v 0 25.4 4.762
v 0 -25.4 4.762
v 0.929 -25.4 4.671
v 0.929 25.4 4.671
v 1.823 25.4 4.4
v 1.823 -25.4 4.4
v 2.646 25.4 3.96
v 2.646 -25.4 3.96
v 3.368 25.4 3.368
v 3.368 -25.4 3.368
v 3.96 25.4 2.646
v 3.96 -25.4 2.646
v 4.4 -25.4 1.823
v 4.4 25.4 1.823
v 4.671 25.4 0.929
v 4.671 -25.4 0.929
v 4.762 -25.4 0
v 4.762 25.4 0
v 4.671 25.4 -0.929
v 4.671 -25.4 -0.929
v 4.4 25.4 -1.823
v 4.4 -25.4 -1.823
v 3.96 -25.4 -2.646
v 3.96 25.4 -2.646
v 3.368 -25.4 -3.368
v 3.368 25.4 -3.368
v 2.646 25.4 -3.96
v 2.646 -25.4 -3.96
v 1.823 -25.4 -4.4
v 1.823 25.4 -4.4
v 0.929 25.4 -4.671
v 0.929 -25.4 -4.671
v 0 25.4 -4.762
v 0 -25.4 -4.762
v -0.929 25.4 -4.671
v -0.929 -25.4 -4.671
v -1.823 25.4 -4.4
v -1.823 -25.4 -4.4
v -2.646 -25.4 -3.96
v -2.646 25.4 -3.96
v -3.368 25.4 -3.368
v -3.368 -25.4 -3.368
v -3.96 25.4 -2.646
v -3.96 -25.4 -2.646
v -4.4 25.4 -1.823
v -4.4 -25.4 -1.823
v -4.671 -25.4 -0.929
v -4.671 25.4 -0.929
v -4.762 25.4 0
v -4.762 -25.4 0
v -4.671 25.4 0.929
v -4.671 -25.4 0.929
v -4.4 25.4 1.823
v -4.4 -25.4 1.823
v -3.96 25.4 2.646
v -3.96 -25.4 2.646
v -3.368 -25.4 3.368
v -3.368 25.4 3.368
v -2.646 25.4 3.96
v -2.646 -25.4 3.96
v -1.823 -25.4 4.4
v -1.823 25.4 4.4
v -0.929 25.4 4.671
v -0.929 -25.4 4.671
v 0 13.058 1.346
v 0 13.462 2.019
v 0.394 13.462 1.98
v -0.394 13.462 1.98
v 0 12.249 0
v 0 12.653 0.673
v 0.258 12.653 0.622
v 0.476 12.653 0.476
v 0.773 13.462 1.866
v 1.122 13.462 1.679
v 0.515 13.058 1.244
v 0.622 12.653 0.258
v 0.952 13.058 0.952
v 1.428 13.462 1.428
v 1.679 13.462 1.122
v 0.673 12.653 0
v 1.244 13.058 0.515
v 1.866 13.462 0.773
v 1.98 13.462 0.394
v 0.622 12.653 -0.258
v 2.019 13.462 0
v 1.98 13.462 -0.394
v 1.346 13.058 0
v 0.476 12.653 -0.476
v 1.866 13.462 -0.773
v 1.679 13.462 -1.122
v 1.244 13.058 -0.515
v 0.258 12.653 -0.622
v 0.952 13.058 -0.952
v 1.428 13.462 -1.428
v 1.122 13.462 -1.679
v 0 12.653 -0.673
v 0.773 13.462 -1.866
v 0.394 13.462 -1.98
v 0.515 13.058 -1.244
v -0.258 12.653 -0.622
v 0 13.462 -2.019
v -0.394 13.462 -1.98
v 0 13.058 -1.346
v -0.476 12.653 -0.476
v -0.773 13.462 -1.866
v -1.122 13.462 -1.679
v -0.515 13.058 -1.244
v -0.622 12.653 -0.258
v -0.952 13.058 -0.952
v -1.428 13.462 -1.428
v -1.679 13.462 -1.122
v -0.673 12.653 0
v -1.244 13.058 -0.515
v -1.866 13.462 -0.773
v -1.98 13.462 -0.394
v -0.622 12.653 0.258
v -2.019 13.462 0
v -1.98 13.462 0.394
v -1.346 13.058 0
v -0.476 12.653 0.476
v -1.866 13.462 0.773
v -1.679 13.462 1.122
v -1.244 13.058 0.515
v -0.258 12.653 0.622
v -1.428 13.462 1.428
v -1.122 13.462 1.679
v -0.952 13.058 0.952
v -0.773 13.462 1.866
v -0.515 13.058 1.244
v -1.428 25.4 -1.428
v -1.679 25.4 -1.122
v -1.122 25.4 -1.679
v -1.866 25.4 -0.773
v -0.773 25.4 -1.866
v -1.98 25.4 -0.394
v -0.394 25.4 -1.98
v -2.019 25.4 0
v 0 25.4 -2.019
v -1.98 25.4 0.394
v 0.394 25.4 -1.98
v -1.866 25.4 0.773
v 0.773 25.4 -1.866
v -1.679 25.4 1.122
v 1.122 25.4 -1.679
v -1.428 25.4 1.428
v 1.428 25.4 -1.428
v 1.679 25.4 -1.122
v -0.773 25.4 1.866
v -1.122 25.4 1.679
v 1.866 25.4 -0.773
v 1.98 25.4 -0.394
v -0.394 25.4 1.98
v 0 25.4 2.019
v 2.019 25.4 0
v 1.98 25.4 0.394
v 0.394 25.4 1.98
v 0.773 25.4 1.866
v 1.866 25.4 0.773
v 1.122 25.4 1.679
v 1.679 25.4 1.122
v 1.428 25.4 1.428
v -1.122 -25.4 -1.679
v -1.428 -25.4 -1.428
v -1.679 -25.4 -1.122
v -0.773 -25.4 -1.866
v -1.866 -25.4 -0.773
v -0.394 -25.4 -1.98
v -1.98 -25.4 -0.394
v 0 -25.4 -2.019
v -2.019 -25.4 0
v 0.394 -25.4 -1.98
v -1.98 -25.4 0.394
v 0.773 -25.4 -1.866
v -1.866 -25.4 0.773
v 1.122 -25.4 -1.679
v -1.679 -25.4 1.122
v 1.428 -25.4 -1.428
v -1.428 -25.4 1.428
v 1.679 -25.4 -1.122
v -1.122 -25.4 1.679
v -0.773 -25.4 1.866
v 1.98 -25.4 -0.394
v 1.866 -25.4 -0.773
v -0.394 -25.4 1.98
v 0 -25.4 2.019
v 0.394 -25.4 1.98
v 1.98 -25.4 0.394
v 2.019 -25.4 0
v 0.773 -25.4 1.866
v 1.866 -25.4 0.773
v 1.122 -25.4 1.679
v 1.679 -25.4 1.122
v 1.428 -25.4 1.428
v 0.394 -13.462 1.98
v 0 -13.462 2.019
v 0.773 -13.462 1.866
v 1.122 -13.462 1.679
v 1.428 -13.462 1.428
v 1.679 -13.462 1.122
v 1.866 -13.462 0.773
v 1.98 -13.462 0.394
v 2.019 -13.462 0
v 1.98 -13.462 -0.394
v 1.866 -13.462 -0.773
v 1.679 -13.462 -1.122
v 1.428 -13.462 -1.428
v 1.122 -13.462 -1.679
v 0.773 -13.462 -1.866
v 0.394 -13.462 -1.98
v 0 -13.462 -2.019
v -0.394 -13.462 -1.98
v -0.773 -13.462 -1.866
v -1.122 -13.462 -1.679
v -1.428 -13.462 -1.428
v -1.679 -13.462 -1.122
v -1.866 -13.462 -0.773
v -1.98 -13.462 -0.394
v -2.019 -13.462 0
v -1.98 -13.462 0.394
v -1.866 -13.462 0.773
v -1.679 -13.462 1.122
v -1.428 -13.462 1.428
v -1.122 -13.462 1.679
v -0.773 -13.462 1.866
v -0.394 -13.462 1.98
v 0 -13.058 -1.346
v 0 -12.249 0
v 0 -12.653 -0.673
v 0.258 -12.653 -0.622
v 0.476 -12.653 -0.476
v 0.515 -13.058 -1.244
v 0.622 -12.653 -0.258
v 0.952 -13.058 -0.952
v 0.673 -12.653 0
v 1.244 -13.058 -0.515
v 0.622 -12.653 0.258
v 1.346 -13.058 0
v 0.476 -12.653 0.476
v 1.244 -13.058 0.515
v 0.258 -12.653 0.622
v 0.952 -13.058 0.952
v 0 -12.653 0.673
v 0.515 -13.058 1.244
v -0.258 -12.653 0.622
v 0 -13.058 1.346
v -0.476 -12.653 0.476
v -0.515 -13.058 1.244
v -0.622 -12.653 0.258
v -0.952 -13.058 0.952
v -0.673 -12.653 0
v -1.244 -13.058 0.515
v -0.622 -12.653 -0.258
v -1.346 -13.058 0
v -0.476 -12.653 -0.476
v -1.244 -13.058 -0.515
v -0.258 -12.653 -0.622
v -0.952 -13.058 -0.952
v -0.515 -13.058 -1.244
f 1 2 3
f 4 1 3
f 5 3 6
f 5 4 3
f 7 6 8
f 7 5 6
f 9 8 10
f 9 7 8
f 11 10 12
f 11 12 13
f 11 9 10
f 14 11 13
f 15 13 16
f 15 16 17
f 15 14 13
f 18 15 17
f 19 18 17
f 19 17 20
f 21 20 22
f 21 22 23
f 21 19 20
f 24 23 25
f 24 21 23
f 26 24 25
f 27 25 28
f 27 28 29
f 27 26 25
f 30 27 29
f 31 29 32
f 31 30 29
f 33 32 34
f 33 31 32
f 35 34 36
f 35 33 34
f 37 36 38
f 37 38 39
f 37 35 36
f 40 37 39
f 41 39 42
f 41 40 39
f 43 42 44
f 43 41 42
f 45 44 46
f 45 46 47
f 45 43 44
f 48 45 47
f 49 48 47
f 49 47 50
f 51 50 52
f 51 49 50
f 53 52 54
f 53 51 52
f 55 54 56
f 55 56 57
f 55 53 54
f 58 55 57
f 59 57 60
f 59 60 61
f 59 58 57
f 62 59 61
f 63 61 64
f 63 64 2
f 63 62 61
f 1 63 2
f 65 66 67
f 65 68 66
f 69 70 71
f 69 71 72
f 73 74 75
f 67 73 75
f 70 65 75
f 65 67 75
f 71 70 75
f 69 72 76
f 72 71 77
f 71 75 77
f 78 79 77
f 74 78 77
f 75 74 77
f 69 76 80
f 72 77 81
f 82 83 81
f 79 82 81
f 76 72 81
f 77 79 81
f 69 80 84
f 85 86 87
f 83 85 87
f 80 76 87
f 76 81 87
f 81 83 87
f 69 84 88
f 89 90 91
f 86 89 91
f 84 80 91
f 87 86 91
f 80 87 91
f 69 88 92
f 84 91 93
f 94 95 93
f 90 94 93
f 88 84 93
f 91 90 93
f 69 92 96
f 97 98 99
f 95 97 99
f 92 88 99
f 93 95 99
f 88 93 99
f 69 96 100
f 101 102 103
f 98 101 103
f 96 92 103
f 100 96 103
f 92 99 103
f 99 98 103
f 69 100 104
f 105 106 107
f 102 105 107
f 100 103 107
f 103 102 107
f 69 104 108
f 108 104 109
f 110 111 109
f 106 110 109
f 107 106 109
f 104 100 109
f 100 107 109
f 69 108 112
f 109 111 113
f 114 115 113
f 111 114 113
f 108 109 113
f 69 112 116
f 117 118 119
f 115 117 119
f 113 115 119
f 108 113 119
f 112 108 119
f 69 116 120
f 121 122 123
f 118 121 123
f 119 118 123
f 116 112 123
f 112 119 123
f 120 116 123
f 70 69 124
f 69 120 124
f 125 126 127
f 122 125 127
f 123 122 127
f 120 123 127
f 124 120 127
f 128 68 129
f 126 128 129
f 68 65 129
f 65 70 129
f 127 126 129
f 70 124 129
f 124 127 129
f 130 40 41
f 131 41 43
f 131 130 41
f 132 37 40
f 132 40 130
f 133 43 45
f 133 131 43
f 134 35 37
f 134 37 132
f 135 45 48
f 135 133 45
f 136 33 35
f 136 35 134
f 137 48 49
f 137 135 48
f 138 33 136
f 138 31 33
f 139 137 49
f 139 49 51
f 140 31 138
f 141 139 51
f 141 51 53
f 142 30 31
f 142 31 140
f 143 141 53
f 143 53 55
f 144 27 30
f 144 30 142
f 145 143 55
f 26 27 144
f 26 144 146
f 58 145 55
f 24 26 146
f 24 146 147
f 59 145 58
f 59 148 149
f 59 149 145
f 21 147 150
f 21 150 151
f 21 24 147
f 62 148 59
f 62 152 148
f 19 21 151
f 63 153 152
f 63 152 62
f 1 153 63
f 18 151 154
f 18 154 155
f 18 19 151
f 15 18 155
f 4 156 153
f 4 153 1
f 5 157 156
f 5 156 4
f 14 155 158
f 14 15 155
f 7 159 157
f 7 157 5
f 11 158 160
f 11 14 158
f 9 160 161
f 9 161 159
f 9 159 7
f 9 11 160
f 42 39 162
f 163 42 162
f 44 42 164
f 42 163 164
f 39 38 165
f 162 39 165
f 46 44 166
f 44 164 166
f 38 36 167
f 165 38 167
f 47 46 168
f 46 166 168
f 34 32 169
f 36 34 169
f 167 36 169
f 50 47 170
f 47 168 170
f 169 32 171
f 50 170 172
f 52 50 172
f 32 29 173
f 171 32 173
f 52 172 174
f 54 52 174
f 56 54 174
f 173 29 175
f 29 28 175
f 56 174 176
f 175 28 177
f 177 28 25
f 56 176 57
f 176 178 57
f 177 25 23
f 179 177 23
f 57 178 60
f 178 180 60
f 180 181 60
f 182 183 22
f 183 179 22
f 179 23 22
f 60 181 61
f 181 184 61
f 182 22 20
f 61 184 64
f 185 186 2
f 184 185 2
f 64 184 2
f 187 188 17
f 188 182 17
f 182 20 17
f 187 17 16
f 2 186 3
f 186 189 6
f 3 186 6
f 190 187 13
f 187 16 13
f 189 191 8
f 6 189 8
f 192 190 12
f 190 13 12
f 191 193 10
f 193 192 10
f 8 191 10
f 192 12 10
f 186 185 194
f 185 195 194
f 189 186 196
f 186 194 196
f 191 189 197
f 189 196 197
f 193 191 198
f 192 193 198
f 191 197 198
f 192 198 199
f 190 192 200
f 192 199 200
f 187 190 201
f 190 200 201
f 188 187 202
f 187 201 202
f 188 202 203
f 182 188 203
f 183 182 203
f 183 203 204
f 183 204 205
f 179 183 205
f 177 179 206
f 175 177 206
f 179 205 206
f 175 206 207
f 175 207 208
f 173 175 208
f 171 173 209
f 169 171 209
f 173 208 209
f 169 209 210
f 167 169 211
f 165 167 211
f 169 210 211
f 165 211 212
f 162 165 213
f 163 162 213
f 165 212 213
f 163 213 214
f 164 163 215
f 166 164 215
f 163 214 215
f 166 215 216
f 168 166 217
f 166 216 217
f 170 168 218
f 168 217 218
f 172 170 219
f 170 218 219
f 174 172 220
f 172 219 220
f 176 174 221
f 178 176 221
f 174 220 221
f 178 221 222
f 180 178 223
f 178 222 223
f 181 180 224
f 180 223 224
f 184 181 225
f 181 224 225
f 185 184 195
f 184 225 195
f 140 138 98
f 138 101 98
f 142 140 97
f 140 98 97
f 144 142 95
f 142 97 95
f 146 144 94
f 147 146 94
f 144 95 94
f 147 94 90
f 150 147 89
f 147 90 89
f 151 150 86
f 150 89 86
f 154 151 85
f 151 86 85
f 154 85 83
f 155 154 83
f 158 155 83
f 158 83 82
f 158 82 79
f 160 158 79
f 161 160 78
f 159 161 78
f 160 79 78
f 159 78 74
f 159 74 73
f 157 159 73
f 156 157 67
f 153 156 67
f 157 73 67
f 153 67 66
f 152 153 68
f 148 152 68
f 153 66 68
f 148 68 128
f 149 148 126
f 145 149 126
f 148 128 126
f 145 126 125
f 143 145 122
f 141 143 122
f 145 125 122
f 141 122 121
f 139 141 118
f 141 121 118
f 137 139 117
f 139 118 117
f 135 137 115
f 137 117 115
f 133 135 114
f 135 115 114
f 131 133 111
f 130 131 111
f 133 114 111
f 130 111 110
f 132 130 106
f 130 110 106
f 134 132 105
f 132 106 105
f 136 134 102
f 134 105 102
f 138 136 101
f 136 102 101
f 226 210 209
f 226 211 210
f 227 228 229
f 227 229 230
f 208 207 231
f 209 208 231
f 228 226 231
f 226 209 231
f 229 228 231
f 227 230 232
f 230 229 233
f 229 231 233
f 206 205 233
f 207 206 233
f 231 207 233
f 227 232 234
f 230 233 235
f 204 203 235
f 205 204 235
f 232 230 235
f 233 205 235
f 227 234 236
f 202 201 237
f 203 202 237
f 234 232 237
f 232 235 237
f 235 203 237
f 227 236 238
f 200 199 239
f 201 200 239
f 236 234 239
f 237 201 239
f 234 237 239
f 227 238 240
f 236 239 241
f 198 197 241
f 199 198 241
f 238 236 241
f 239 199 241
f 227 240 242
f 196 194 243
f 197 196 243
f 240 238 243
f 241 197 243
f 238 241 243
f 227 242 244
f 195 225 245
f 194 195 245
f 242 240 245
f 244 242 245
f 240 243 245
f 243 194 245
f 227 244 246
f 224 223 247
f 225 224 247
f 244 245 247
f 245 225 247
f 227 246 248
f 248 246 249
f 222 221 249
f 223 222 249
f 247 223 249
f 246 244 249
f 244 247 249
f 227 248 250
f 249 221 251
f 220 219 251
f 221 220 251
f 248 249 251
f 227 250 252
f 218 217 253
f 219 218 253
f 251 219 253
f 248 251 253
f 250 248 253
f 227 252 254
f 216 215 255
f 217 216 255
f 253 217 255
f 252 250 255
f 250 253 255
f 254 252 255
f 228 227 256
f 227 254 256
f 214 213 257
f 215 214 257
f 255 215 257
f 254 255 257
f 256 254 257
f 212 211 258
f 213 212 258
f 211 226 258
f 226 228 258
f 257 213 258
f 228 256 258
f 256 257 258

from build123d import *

# Parameters (mm, degrees)
SKETCH1_R                            = 4.7625
BOSS_EXTRUDE1_DEPTH                  = 25.4
F_10_32_TAPPED_HOLE1_D               = 4.0386
F_10_32_TAPPED_HOLE1_DEPTH           = 11.938
F_10_32_TAPPED_HOLE1_TIP             = 1.213317848
F_10_32_TAPPED_HOLE1_ON_FACE_2_D     = 4.0386
F_10_32_TAPPED_HOLE1_ON_FACE_2_DEPTH = 11.938
F_10_32_TAPPED_HOLE1_ON_FACE_2_TIP   = 1.213317848


with BuildPart() as part:
    # Sketch1 → Boss-Extrude1 (new, symmetric)
    with BuildSketch(Plane(origin=(0, 0, 0), x_dir=(1, 0, 0), z_dir=(0, 1, 0))):
        with Locations(Location((0, 0, 0), (0, 0, 270))):
            Circle(SKETCH1_R)
    extrude(amount=BOSS_EXTRUDE1_DEPTH, both=True)

    # #10-32 Tapped Hole1
    with Locations(Plane(origin=(0, -25.4, 0), x_dir=(0, 0, -1), z_dir=(0, -1, 0))):
        with Locations((0, 0)):
            Hole(F_10_32_TAPPED_HOLE1_D / 2, depth=F_10_32_TAPPED_HOLE1_DEPTH)
            with Locations((0, 0, -(F_10_32_TAPPED_HOLE1_DEPTH + F_10_32_TAPPED_HOLE1_TIP / 2))):  # 118° drill point
                Cone(0, F_10_32_TAPPED_HOLE1_D / 2, F_10_32_TAPPED_HOLE1_TIP, mode=Mode.SUBTRACT)

    # #10-32 Tapped Hole1 on face 2
    with Locations(Plane.ZX.offset(25.4)):
        with Locations((0, 0)):
            Hole(F_10_32_TAPPED_HOLE1_ON_FACE_2_D / 2, depth=F_10_32_TAPPED_HOLE1_ON_FACE_2_DEPTH)
            with Locations((0, 0, -(F_10_32_TAPPED_HOLE1_ON_FACE_2_DEPTH + F_10_32_TAPPED_HOLE1_ON_FACE_2_TIP / 2))):  # 118° drill point
                Cone(0, F_10_32_TAPPED_HOLE1_ON_FACE_2_D / 2, F_10_32_TAPPED_HOLE1_ON_FACE_2_TIP, mode=Mode.SUBTRACT)


solid = part.part
